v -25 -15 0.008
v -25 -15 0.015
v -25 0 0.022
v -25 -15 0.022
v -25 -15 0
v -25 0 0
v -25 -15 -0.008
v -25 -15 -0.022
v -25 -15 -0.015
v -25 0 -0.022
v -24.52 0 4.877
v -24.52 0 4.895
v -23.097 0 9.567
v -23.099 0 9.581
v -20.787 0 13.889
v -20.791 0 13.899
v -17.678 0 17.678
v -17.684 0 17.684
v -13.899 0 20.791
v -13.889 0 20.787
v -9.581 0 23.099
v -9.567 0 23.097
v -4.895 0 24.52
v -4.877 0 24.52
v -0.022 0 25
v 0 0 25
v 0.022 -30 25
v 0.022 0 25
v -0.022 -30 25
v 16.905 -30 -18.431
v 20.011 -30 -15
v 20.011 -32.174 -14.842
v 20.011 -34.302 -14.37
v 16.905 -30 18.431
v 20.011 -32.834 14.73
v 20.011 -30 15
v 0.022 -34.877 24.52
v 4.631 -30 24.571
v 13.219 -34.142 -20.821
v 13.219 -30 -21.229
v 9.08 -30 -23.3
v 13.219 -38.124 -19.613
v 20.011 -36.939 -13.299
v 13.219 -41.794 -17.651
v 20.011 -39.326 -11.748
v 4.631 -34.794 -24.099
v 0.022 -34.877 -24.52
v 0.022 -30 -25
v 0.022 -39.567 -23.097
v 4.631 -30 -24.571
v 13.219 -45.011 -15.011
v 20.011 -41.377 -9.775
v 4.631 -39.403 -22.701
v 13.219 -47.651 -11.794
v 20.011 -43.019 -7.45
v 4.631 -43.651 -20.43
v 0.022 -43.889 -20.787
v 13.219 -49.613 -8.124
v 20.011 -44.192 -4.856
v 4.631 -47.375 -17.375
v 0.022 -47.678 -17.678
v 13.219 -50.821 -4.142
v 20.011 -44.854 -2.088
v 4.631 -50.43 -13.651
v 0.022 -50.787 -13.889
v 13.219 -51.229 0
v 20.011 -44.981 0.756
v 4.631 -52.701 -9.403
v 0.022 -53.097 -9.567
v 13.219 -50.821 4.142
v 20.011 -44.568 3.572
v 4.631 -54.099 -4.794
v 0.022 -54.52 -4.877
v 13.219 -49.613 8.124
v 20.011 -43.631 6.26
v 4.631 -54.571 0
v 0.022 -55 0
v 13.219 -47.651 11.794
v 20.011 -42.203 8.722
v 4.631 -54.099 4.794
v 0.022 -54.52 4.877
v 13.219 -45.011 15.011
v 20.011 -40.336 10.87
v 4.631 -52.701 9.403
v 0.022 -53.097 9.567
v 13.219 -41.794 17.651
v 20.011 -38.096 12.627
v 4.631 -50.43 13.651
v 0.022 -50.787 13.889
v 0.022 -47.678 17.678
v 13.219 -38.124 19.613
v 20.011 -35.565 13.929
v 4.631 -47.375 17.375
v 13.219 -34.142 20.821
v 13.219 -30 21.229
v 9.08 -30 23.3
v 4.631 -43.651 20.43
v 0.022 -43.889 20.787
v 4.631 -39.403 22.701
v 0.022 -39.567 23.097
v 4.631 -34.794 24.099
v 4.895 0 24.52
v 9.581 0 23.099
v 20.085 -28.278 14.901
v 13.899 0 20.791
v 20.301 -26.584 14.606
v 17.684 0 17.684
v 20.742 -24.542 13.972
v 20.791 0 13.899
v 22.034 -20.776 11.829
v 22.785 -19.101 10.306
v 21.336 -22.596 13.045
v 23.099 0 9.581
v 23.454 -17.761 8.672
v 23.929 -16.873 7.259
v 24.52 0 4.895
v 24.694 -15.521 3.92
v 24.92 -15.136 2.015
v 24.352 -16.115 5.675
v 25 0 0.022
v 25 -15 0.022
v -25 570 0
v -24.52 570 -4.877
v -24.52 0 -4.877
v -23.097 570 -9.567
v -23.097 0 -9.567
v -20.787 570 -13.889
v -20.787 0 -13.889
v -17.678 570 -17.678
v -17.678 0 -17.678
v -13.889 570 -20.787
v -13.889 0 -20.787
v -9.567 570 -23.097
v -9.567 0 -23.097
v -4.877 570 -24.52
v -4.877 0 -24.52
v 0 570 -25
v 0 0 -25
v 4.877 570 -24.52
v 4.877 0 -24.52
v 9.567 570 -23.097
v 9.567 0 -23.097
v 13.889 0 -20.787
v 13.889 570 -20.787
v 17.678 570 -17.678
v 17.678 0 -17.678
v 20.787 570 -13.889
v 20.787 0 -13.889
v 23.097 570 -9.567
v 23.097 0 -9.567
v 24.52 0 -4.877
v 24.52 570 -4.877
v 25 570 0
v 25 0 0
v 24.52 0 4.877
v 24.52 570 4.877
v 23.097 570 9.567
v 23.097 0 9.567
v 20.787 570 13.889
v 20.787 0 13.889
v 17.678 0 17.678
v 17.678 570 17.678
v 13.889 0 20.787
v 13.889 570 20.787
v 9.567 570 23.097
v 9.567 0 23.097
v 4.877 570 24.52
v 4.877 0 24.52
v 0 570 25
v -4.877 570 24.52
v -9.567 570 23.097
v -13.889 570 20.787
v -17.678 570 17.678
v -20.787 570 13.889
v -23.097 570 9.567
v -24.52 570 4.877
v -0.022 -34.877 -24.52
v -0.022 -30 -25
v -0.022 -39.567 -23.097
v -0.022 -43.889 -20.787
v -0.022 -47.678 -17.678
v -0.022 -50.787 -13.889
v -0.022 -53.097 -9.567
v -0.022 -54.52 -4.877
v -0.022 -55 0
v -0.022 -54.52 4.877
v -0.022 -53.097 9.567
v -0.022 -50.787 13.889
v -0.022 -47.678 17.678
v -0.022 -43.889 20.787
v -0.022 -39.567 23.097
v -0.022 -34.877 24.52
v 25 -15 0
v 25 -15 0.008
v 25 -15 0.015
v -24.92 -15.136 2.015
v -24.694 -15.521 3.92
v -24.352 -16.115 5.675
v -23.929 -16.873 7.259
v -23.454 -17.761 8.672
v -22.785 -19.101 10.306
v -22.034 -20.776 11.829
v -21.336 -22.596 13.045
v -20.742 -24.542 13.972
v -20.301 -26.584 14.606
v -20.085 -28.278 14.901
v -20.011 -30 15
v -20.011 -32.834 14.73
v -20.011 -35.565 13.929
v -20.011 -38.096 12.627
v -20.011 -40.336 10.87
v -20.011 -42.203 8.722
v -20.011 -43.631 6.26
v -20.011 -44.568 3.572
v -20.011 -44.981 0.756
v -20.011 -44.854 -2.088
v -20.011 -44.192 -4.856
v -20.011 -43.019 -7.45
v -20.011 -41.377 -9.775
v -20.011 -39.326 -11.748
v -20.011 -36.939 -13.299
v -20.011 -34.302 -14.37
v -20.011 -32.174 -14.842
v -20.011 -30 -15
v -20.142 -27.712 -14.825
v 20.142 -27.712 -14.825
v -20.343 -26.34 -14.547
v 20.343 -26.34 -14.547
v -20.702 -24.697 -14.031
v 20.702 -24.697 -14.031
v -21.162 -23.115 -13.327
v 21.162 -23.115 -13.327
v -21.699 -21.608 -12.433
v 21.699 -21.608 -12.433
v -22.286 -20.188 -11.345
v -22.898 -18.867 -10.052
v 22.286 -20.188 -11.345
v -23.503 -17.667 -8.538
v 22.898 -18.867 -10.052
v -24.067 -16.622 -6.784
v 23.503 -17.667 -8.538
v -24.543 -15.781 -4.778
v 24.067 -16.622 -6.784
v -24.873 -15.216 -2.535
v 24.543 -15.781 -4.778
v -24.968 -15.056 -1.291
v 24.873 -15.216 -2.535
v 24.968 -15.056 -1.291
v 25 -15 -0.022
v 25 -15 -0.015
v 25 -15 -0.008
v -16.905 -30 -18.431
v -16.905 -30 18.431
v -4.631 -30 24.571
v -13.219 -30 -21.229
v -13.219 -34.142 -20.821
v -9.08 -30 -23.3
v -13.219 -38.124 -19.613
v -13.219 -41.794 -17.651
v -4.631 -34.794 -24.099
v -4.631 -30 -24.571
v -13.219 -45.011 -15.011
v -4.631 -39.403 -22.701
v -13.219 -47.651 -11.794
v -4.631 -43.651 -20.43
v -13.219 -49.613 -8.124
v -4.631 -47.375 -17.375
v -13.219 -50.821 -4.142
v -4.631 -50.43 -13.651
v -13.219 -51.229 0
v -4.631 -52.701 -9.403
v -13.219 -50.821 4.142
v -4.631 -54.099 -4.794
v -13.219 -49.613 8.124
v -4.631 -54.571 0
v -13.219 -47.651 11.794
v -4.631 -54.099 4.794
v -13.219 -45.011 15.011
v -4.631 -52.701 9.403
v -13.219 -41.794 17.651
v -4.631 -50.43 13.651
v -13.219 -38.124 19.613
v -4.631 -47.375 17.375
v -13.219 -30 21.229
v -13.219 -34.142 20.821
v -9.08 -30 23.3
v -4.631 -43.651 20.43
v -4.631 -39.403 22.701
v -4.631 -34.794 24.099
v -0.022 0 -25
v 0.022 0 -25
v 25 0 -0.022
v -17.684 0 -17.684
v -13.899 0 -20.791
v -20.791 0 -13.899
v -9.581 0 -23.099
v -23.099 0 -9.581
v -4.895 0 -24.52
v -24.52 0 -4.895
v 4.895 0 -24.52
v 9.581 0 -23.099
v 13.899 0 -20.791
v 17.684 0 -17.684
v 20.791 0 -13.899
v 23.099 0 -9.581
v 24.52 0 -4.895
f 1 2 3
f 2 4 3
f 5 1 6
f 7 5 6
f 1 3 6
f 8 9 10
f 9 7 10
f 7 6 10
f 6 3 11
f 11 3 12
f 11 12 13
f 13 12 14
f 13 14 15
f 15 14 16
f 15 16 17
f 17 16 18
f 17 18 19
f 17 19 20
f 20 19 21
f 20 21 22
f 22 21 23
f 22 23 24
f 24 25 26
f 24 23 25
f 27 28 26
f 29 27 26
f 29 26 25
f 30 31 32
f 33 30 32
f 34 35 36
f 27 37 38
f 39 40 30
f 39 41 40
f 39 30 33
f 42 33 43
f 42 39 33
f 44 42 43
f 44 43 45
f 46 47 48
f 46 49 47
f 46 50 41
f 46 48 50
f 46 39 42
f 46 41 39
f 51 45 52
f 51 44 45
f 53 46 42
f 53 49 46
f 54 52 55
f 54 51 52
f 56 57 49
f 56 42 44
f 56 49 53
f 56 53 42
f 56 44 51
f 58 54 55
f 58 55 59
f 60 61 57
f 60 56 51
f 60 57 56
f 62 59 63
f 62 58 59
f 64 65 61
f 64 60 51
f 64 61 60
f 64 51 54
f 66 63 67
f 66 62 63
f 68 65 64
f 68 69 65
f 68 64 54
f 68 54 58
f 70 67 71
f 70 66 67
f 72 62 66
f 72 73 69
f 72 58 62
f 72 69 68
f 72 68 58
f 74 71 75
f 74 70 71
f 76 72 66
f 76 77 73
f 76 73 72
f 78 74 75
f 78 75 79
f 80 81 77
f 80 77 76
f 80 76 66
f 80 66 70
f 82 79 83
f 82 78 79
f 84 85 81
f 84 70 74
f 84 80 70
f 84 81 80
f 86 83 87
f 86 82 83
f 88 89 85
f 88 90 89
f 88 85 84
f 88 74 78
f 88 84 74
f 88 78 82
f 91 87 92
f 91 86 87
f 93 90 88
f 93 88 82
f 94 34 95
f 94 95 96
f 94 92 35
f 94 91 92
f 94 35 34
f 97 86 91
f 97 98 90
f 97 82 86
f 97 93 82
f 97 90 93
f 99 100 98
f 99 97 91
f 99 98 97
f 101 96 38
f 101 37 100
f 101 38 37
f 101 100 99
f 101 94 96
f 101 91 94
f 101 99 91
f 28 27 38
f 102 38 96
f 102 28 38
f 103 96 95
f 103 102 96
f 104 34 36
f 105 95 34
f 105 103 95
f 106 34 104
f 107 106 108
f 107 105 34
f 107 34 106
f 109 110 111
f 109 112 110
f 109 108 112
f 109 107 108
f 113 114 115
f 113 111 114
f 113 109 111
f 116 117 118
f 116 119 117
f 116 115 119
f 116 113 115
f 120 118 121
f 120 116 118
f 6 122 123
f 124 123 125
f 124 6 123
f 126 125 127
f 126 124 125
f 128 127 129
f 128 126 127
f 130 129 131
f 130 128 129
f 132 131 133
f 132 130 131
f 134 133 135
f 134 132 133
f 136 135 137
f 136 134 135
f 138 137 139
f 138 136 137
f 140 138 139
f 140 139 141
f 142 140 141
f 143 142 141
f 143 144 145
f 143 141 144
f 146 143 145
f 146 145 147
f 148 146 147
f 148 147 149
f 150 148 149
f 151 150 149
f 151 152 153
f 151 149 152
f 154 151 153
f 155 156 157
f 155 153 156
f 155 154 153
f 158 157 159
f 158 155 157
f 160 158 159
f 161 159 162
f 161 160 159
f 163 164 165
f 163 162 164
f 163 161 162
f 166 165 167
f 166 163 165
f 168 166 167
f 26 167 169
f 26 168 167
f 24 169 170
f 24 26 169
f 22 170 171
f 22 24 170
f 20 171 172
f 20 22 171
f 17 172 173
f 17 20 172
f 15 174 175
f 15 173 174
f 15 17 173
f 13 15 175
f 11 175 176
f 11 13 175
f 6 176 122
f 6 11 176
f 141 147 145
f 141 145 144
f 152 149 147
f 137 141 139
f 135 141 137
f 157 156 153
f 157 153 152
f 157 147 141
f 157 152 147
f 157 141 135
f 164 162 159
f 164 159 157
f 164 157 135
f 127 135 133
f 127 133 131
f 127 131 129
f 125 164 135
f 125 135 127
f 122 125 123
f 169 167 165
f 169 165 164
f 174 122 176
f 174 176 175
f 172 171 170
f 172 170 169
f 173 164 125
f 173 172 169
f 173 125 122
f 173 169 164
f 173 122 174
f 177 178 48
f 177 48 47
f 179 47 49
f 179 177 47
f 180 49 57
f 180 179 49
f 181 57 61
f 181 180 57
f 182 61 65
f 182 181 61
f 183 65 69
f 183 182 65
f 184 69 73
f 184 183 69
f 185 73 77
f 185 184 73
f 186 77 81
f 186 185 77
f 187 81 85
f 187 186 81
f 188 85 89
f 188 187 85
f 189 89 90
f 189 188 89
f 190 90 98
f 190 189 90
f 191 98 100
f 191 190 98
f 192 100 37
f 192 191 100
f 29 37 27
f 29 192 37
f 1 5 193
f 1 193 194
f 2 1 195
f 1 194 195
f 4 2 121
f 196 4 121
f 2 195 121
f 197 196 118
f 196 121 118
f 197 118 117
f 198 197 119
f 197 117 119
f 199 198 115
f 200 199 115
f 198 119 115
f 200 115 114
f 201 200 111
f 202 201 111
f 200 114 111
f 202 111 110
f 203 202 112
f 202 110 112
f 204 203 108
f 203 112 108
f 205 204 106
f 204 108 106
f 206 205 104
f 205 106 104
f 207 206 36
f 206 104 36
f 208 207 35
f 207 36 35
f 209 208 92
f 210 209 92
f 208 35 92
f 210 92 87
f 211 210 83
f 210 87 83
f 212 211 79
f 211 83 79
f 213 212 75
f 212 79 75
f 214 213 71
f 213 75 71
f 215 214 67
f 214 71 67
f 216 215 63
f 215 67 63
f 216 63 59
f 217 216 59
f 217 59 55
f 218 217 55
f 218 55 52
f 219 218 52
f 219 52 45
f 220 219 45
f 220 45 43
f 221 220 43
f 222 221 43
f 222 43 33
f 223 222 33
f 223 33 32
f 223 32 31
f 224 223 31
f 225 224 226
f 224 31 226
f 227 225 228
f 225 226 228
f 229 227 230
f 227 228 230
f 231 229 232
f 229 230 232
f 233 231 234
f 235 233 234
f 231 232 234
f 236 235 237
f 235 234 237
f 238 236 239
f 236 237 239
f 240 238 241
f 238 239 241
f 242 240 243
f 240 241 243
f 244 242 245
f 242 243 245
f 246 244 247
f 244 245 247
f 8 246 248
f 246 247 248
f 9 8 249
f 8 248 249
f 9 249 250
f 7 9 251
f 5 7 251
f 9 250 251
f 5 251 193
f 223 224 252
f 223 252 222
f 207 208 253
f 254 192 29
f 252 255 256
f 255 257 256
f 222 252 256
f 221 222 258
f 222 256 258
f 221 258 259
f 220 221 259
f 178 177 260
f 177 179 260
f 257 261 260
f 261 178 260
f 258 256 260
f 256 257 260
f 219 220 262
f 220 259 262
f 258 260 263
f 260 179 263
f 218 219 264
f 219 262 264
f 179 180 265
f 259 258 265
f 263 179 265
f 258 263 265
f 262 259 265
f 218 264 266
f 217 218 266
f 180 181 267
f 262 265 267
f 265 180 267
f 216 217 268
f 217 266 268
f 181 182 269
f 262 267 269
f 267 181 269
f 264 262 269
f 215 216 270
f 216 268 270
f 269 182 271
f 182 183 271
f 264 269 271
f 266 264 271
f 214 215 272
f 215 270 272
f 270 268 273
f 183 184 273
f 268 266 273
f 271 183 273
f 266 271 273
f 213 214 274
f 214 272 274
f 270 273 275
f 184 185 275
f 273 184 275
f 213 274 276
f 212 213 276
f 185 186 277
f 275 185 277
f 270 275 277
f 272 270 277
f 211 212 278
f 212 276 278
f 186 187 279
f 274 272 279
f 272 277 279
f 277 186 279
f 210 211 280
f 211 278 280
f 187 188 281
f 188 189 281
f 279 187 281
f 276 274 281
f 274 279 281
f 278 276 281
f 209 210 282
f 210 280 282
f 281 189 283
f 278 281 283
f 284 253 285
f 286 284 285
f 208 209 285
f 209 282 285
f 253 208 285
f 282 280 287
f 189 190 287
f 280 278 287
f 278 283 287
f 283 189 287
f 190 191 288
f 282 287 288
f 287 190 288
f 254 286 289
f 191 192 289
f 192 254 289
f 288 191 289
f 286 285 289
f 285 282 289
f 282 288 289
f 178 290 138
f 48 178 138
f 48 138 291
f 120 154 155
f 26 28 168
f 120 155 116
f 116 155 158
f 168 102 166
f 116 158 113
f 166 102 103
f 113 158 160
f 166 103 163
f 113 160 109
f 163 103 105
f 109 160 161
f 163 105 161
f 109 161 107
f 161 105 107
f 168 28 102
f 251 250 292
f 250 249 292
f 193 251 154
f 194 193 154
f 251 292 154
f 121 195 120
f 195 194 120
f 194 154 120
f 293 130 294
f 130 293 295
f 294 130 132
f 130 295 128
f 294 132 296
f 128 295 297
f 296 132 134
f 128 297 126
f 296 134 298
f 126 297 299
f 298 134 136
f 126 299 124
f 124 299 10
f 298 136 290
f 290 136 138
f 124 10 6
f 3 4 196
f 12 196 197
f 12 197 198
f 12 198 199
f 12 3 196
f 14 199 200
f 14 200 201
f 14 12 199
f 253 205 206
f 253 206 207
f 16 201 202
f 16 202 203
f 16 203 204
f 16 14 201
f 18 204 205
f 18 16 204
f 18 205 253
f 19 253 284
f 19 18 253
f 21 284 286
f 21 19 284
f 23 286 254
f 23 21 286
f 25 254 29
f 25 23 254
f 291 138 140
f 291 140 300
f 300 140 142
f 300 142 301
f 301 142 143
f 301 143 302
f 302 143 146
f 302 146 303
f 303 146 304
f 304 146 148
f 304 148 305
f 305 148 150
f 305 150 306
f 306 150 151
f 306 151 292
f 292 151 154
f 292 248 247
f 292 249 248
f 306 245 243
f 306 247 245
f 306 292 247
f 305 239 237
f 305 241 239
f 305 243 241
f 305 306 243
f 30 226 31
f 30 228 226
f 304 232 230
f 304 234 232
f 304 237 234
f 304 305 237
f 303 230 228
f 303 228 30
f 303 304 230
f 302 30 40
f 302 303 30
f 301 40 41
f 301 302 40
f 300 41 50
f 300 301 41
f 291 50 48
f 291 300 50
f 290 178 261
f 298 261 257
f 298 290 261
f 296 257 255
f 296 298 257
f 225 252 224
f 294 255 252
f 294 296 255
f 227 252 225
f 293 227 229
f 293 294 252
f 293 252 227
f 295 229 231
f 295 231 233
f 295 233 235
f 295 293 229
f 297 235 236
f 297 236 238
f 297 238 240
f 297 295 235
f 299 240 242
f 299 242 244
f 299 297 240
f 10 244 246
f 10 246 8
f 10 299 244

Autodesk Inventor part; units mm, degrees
ref_plane "XZ Plane" through (0, 0, 0) normal (0, 1, 0) x (-1, 0, 0)
ref_plane "XY Plane" through (0, 0, 0) normal (0, 0, 1) x (1, 0, 0)
sketch "Sketch1" plane through (0, 0, 0) normal (0, 1, 0) x (-1, 0, 0)
  circle A0 centre (0, 0) radius 25
  dimension "d0" = 50
extrude "Extrusion1" add sketch "Sketch1" along normal blind 570
sketch "Sketch2" plane through (0, 0, 0) normal (0, -1, 0) x (1, 0, 0)
  line L0 (-25, -25) -> (25, -25)
  line L1 (25, -25) -> (25, 25)
  line L2 (25, 25) -> (-25, 25)
  line L3 (-25, 25) -> (-25, -25)
  point P0 (0, 0)
extrude "Extrusion2" add sketch "Sketch2" along normal blind 60
sketch "Sketch3" plane through (0, 0, 0) normal (1, 0, 0) x (0, 1, 0)
  circle A0 centre (-30, 0) radius 15
  line L0 (0, -25) -> (0, 0) projected
  line L1 (0, 25) -> (-60, 25) projected
  line L2 (0, -25) -> (-60, -25) projected
  arc A1 (-30, 25) -> (-30, -25) centre (-30, 0) ccw
  line L3 (-30, 25) -> (-30, 40.1158)
  line L4 (-30, 40.1158) -> (-76.6193, 40.1158)
  line L5 (-76.6193, 40.1158) -> (-77.4473, -45.6375)
  line L6 (-77.4473, -45.6375) -> (-35.1048, -45.6375)
  line L7 (-35.1048, -45.6375) -> (-30, -25)
  dimension "d5" = 30
  dimension "d6" = 30
extrude "Extrusion3" cut sketch "Sketch3" along normal mid plane 100
fillet "Fillet1" radius 24.9775 6 edges at (25, -55, 0) (25, -15, -25) (25, -15, 25) (-25, -55, 0) (-25, -15, -25) (-25, -15, 25)
properties part number "Piston_Bom"
